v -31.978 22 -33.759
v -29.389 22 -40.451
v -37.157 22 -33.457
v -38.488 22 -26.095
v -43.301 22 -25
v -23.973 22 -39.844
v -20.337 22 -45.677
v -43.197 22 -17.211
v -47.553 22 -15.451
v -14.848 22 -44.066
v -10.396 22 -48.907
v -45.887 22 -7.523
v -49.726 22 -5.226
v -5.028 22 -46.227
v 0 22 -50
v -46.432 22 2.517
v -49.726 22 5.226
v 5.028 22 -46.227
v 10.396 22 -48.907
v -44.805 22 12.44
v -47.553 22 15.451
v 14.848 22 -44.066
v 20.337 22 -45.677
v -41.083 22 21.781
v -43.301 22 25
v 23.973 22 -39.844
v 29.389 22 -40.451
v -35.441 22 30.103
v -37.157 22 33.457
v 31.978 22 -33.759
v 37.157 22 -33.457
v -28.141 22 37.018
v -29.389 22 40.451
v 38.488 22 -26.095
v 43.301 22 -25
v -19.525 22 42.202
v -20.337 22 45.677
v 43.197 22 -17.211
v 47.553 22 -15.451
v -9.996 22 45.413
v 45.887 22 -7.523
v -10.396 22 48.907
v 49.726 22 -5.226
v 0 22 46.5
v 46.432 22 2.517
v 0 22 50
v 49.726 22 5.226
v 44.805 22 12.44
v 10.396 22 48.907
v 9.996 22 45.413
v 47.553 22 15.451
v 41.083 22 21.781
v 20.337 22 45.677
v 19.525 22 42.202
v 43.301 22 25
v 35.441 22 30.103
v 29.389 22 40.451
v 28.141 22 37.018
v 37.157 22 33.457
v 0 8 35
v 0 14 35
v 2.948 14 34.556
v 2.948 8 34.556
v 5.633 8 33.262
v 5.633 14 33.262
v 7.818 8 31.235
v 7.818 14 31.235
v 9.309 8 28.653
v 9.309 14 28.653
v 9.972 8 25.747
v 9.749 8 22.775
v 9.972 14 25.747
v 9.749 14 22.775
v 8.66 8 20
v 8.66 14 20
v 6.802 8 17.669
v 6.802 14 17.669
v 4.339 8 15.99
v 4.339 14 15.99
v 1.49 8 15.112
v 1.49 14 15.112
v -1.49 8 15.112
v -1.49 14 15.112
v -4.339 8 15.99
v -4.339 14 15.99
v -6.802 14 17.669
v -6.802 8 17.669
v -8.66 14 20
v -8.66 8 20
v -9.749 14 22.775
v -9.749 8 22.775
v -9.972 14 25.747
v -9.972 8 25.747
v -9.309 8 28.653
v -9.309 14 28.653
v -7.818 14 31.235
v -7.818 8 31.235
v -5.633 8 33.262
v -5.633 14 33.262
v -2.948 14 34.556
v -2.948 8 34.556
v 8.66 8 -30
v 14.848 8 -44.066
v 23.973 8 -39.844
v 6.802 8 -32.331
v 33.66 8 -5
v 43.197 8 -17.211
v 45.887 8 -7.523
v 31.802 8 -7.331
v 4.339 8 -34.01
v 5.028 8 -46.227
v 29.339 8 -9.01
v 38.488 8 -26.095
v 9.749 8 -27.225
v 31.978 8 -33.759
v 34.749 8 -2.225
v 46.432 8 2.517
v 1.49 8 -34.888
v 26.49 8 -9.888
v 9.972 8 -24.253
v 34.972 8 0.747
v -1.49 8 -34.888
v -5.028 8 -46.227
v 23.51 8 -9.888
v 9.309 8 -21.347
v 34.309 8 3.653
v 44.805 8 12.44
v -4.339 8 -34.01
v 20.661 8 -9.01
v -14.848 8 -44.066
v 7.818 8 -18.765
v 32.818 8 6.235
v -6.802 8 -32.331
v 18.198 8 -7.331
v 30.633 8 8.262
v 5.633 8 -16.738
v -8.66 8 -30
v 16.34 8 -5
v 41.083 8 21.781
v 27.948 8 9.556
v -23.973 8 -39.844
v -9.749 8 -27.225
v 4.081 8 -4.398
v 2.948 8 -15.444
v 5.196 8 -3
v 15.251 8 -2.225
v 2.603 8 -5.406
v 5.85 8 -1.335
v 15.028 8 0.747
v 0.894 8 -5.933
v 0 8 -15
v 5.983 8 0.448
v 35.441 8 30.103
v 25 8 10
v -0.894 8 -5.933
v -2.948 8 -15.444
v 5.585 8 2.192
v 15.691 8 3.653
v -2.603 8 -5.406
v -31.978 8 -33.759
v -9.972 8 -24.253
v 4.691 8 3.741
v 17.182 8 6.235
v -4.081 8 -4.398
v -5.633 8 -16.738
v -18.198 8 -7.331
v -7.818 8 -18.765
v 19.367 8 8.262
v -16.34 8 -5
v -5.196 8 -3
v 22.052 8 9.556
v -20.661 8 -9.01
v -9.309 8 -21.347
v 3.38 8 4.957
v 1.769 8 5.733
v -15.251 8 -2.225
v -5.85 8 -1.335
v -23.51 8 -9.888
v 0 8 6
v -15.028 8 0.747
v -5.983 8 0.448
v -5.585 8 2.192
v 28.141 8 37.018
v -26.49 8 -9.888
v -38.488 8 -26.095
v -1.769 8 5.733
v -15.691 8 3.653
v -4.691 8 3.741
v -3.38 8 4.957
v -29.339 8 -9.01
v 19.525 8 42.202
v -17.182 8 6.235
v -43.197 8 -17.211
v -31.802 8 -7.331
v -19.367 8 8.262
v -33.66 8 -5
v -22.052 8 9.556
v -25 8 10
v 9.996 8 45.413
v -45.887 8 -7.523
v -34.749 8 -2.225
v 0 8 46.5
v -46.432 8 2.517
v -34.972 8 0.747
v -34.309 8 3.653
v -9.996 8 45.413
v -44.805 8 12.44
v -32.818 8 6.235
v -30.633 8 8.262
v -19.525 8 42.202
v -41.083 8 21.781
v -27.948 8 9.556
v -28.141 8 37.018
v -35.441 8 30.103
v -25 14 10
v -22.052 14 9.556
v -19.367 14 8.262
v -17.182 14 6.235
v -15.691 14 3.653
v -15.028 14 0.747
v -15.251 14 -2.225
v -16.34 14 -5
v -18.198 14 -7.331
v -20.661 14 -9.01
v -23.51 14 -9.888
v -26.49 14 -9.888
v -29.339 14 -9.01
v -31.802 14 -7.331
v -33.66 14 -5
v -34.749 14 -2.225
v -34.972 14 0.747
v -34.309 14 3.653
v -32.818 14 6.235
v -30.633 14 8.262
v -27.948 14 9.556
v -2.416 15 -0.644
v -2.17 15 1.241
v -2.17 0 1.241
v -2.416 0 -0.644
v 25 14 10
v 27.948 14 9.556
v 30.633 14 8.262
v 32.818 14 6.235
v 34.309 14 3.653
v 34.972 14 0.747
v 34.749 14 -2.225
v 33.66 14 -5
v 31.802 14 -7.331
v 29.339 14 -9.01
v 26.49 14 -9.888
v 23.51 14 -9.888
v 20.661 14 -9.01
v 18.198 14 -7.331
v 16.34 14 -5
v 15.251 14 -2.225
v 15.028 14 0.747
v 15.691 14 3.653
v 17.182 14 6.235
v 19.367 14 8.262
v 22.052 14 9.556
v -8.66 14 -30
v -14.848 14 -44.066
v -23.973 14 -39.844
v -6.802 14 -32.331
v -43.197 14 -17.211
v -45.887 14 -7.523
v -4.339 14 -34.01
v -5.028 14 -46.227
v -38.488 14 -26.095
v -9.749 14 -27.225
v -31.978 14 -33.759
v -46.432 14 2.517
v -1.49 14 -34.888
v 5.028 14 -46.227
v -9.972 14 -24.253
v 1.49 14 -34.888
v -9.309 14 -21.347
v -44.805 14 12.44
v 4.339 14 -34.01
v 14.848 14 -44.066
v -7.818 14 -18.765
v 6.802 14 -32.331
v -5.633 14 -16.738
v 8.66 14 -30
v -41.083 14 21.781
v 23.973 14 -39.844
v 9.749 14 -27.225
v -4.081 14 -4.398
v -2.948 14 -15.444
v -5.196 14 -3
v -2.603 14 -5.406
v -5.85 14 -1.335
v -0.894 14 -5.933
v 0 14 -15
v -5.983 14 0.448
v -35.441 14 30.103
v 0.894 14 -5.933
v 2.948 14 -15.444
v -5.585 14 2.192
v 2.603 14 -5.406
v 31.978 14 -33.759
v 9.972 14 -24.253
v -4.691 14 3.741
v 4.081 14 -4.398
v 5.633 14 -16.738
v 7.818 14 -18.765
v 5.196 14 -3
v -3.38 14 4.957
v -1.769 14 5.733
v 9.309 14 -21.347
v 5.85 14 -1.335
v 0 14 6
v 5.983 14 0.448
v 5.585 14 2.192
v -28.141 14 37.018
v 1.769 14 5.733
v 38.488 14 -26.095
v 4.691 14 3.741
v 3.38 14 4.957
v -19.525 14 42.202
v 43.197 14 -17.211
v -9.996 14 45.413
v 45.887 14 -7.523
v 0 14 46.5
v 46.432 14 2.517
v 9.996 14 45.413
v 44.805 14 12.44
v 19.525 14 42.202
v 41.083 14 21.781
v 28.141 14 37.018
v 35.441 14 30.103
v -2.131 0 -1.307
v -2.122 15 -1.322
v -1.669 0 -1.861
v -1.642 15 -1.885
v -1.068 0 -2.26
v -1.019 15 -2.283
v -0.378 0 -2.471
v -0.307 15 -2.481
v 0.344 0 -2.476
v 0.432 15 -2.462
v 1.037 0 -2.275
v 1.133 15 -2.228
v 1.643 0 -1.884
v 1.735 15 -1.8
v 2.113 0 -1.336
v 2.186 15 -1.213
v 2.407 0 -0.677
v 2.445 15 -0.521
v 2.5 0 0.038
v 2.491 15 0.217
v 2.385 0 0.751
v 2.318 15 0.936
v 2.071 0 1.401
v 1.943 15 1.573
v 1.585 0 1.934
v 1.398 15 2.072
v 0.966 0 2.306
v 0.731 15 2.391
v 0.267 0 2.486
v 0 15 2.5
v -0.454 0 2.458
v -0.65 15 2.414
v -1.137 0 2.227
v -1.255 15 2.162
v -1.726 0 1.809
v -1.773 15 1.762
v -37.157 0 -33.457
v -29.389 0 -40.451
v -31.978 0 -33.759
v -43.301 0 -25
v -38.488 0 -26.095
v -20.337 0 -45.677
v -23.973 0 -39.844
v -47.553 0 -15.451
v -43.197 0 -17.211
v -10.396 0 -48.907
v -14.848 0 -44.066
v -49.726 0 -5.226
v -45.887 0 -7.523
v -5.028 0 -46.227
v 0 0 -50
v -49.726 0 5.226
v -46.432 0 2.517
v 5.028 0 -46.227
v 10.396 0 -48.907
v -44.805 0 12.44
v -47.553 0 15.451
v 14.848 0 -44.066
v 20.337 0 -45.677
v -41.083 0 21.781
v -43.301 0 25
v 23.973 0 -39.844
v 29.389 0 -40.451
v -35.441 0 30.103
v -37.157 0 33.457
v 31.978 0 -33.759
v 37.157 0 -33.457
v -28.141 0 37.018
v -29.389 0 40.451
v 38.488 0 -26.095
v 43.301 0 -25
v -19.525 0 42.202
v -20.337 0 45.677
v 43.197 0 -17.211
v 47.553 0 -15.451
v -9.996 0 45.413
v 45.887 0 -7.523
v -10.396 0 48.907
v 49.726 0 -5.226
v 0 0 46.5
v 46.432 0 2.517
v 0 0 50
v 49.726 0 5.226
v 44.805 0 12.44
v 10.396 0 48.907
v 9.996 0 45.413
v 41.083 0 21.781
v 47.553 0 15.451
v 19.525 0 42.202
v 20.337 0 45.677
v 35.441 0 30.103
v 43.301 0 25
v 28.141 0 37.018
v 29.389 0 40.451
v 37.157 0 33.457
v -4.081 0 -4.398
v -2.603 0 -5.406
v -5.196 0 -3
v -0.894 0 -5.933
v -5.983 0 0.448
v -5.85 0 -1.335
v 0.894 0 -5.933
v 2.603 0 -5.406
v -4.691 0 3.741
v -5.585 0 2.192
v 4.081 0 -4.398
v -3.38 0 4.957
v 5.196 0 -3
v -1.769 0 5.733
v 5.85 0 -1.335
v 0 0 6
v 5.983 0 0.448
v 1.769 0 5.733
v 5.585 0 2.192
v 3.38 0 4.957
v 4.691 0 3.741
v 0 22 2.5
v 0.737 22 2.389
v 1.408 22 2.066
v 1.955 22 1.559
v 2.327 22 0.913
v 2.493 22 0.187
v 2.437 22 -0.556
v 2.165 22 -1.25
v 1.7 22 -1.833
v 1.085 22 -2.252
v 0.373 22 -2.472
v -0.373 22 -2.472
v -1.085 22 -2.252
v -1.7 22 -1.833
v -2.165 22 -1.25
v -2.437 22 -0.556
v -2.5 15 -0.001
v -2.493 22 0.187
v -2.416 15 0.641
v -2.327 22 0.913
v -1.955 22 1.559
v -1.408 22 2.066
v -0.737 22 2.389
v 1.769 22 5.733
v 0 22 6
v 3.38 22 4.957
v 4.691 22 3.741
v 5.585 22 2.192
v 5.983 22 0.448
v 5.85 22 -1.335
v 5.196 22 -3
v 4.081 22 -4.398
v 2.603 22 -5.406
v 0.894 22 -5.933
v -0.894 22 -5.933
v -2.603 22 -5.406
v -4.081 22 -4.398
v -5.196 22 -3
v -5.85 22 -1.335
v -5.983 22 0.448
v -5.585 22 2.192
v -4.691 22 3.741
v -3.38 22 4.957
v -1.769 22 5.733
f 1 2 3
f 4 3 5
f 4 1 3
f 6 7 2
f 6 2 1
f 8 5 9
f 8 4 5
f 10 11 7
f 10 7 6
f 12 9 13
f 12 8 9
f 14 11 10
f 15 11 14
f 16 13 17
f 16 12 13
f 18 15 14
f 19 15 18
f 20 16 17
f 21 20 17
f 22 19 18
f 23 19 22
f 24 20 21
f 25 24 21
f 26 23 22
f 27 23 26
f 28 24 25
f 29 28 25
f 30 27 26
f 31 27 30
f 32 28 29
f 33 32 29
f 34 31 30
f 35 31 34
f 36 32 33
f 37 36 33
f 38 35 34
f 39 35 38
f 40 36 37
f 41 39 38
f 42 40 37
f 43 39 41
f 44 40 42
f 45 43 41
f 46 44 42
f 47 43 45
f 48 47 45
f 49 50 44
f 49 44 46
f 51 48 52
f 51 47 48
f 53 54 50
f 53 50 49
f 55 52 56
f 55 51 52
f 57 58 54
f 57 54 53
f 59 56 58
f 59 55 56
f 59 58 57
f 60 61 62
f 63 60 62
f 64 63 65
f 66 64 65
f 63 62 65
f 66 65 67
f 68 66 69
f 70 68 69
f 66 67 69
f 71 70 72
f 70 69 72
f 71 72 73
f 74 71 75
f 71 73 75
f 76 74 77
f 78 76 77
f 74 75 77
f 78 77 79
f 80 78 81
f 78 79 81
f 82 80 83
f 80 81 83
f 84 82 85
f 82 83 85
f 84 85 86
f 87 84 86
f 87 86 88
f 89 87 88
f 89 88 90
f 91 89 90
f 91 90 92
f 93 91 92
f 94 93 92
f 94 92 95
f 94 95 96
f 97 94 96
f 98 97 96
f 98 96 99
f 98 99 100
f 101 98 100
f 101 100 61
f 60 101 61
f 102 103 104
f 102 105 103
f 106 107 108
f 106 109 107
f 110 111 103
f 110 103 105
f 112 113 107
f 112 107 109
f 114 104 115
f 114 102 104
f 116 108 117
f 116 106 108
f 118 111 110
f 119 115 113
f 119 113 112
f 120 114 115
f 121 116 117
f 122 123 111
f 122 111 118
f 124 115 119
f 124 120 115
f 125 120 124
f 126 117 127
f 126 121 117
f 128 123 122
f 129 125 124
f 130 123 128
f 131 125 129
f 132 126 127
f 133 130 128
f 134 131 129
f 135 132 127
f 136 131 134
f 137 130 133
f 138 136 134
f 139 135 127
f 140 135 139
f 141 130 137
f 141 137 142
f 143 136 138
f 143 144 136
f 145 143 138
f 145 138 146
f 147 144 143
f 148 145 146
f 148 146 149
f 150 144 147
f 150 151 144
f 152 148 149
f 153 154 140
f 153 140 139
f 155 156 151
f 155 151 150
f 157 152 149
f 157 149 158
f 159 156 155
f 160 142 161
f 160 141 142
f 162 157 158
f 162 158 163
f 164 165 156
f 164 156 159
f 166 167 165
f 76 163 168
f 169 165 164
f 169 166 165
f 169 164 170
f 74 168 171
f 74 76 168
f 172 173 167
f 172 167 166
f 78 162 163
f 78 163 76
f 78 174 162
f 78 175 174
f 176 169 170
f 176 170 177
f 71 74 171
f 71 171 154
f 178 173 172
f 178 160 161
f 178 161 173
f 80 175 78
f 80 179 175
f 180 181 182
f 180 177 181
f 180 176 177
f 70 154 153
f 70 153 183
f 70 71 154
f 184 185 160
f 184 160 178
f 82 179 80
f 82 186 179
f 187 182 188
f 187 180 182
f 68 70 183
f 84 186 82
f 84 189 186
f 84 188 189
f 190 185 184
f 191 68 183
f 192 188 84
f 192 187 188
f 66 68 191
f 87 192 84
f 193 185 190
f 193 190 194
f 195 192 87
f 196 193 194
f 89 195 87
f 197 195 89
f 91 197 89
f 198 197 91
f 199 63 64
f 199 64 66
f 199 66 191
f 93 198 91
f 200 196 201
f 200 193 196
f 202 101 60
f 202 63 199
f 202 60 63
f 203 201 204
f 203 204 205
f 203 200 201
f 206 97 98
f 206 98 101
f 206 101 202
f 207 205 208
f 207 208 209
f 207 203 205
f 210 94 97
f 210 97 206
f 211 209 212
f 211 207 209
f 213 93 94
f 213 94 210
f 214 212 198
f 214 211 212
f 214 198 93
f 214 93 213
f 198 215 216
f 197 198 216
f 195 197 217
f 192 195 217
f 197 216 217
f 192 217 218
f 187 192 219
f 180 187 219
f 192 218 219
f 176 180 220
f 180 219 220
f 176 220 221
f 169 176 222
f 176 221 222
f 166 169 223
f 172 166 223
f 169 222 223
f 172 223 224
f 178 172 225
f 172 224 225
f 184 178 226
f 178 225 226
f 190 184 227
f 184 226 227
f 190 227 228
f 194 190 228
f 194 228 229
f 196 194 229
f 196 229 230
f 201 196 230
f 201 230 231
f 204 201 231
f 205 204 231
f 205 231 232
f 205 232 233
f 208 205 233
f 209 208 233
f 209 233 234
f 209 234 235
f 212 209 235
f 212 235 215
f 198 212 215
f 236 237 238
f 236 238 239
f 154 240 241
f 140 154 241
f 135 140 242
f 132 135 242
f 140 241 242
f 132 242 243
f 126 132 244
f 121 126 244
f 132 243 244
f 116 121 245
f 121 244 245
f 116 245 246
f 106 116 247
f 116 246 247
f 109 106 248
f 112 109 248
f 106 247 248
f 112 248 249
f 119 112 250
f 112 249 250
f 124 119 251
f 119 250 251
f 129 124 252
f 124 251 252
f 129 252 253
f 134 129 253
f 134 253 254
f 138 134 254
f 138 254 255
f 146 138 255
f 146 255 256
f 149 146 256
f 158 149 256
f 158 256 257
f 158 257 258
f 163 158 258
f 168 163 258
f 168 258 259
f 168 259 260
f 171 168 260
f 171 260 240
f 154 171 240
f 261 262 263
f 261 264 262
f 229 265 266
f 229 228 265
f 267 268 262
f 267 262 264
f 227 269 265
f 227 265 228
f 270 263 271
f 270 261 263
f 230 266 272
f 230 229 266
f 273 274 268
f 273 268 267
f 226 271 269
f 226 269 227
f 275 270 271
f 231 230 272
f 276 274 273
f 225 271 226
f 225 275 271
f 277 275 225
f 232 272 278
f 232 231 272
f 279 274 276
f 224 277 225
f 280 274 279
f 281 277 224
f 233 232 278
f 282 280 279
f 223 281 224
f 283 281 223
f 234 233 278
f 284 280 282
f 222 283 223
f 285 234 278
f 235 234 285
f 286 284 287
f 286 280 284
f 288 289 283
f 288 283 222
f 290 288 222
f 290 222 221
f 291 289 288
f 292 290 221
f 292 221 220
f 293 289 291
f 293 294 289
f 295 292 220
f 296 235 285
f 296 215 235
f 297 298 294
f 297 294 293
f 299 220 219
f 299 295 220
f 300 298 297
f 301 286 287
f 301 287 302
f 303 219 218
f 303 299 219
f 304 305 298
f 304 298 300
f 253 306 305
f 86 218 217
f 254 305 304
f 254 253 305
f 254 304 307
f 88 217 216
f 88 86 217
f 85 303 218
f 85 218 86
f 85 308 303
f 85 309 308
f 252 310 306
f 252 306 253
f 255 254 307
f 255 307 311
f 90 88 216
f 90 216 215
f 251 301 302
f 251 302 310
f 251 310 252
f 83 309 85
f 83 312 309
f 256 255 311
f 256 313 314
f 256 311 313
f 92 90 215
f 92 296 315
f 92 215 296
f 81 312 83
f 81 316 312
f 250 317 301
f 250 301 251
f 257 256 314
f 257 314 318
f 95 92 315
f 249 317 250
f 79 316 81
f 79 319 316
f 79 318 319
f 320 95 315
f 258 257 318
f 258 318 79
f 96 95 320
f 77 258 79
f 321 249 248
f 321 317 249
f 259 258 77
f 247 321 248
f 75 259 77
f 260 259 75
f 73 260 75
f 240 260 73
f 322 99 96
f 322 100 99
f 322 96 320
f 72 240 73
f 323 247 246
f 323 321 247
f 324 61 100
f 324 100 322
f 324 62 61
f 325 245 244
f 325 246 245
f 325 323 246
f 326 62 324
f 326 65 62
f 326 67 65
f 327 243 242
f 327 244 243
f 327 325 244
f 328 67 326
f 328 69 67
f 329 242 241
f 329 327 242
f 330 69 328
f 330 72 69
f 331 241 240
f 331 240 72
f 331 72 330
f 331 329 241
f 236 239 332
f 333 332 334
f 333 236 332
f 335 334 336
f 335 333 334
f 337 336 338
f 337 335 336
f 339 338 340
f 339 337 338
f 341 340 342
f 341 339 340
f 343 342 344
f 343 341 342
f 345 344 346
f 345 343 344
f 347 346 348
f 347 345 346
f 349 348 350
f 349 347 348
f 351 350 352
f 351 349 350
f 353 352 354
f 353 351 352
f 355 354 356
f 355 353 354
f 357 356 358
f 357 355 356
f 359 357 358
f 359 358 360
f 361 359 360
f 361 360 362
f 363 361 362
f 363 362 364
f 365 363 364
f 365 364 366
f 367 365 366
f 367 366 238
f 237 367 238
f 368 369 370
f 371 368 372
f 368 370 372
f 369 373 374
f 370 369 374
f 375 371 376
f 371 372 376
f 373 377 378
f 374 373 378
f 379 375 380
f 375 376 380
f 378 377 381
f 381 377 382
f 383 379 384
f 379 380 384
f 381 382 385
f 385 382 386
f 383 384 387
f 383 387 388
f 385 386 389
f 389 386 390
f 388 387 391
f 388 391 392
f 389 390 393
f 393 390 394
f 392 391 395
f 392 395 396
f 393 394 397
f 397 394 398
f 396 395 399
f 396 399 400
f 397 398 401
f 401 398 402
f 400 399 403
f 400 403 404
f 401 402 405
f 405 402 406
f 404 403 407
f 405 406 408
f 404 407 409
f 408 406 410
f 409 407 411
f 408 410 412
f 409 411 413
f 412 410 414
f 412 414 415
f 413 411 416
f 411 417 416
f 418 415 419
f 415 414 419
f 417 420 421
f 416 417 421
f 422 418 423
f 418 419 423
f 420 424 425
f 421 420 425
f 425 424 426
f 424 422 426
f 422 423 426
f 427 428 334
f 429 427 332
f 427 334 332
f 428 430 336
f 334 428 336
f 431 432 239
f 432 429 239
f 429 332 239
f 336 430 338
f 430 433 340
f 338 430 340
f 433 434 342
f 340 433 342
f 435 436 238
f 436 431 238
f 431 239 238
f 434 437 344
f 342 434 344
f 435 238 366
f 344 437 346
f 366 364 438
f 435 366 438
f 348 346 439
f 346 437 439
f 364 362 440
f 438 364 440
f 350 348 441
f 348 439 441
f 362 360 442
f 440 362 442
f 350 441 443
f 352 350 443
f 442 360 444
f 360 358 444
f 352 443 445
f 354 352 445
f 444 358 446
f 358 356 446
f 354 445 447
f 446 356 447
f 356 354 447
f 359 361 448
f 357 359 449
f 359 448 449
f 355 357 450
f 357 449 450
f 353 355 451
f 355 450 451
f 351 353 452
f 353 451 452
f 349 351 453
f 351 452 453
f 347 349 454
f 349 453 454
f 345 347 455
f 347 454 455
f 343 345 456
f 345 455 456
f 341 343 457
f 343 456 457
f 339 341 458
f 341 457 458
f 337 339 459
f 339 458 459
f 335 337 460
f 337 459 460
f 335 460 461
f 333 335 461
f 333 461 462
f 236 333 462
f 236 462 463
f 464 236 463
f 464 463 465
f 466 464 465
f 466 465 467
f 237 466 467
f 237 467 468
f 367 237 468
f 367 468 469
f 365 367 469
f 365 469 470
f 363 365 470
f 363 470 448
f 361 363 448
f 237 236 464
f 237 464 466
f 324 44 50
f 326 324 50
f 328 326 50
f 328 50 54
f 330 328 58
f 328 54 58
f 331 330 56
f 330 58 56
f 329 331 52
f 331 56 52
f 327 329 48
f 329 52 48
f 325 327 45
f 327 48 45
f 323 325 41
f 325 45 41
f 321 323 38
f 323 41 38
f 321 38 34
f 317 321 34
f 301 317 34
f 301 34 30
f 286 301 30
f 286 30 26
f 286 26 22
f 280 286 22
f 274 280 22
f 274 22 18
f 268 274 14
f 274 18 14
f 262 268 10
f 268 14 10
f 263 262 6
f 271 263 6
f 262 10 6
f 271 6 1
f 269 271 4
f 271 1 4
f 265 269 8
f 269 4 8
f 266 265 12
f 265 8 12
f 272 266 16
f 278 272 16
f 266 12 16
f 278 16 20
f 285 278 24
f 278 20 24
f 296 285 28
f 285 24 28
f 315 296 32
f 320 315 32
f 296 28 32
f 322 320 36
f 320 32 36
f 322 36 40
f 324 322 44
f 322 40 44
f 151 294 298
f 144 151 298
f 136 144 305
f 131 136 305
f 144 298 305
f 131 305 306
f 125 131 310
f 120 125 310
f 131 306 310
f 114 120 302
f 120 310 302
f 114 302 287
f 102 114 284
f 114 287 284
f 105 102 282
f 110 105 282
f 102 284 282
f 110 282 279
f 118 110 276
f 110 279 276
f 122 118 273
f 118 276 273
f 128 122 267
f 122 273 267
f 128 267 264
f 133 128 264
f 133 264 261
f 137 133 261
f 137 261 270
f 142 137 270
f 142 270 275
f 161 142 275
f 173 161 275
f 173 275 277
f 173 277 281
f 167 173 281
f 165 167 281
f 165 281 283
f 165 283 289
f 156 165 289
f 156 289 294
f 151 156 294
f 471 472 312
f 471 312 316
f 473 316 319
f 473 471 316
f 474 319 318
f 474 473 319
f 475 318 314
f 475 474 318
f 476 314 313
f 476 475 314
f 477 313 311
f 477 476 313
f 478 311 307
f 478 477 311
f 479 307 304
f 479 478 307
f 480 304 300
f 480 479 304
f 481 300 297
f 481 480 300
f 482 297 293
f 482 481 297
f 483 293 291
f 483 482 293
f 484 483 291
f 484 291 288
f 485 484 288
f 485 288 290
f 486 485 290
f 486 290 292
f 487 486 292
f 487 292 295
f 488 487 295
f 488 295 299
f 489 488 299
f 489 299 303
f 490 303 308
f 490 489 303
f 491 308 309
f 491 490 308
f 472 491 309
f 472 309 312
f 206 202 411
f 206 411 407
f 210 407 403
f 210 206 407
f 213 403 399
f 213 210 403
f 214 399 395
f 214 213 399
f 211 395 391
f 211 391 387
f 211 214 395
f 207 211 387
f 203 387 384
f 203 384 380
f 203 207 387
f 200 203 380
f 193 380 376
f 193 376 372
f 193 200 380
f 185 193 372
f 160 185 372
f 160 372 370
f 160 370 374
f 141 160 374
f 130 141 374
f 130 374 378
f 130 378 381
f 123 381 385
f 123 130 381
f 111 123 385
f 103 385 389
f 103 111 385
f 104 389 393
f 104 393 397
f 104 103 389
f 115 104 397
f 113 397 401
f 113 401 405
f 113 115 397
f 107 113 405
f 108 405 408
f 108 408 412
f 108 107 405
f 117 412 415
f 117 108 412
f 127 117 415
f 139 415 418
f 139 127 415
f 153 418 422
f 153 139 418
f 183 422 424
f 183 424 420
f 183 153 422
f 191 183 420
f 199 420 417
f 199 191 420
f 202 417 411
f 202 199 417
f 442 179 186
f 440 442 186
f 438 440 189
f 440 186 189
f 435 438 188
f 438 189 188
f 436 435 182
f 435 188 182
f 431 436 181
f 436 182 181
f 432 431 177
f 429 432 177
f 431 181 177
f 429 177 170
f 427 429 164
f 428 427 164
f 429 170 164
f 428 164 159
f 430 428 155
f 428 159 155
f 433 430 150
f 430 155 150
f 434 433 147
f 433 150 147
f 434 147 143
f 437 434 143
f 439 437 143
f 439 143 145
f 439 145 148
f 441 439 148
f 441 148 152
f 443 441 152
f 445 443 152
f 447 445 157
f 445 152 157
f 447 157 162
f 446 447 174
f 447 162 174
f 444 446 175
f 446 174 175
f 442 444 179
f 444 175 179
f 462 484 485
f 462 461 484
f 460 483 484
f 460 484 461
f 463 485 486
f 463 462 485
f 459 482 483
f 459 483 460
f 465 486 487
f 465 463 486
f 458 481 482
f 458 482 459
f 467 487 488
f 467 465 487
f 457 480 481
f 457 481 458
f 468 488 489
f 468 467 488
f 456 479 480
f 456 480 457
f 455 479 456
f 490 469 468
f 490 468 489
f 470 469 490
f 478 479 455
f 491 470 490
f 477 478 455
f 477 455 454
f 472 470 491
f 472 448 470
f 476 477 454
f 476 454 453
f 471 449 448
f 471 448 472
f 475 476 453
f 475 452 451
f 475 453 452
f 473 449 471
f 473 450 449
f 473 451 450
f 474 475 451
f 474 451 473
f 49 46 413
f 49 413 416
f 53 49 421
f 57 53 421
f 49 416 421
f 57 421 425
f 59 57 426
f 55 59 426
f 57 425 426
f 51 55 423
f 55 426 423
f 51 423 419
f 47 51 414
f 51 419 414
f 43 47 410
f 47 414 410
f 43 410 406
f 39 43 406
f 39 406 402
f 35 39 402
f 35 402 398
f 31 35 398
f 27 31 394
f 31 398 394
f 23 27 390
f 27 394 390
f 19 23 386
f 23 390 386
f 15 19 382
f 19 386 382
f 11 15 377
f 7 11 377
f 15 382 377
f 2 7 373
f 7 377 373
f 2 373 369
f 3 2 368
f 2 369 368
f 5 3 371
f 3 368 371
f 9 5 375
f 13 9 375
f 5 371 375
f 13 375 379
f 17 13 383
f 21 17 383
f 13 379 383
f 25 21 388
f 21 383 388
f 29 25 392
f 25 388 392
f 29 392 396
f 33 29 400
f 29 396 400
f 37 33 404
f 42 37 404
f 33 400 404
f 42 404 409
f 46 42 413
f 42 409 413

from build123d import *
from build123d.topology import SkipClean

# Parameters (mm, degrees)
ESQUISSE1_R             = 50
BOSS_EXTRU_1_DEPTH      = 22
ESQUISSE2_R             = 2.5
ENL_V_MAT_EXTRU_1_DEPTH = 7
ENL_V_START             = -15
ENL_V_MAT_EXTRU_3_DEPTH = 15
ESQUISSE4_R             = 46.5
ESQUISSE4_R_2           = 6
ENL_V_MAT_EXTRU_4_DEPTH = 8
ENL_V_START_2           = -8
ESQUISSE5_R             = 46.5
ESQUISSE5_R_2           = 6
ENL_V_MAT_EXTRU_5_DEPTH = 8
ESQUISSE6_R             = 10
ENL_V_MAT_EXTRU_6_DEPTH = 8
ESQUISSE7_R             = 10
ENL_V_MAT_EXTRU_7_DEPTH = 8
ESQUISSE8_R             = 10
ENL_V_MAT_EXTRU_8_DEPTH = 8
ESQUISSE9_R             = 10
ENL_V_MAT_EXTRU_9_DEPTH = 8


with BuildPart() as part:
    # Esquisse1 → Boss.-Extru.1 (new body)
    with BuildSketch(Plane(origin=(0, 0, 0), x_dir=(1, 0, 0), z_dir=(0, 1, 0))):
        with Locations(Location((0, 0, 0), (0, 0, 270))):
            Circle(ESQUISSE1_R)
    extrude(amount=BOSS_EXTRU_1_DEPTH)

    # Esquisse2 → Enlèv. mat.-Extru.1 (cut)
    with BuildSketch(Plane(origin=(0, 22, 0), x_dir=(1, 0, 0), z_dir=(0, 1, 0))):
        with Locations(Location((0, 0, 0), (0, 0, 270))):
            Circle(ESQUISSE2_R)
    extrude(amount=-ENL_V_MAT_EXTRU_1_DEPTH, mode=Mode.SUBTRACT)

    # Esquisse3 → Enlèv. mat.-Extru.3 (cut)
    with SkipClean():  # the faces are left unmerged after this step: merging them gives an invalid solid
        with BuildSketch(Plane(origin=(0, 0, 0), x_dir=(-1, 0, 0), z_dir=(0, -1, 0)).offset(ENL_V_START)):
            with BuildLine():
                ThreePointArc((2.415699998, 0.643734045), (-2.479075587, 0.322775824), (2.170328924, -1.240835348))
                Line((2.170328924, -1.240835348), (2.415699998, 0.643734045))
            make_face()
        extrude(amount=ENL_V_MAT_EXTRU_3_DEPTH, mode=Mode.SUBTRACT)

    # Esquisse4 → Enlèv. mat.-Extru.4 (cut)
    with SkipClean():  # the faces are left unmerged after this step: merging them gives an invalid solid
        with BuildSketch(Plane(origin=(0, 22, 0), x_dir=(1, 0, 0), z_dir=(0, 1, 0))):
            with Locations(Location((0, 0, 0), (0, 0, 270))):
                Circle(ESQUISSE4_R)
            with Locations(Location((0, 0, 0), (0, 0, 270))):
                Circle(ESQUISSE4_R_2, mode=Mode.SUBTRACT)
        extrude(amount=-ENL_V_MAT_EXTRU_4_DEPTH, mode=Mode.SUBTRACT)

    # Esquisse5 → Enlèv. mat.-Extru.5 (cut)
    with SkipClean():  # the faces are left unmerged after this step: merging them gives an invalid solid
        with BuildSketch(Plane(origin=(0, 0, 0), x_dir=(-1, 0, 0), z_dir=(0, -1, 0)).offset(ENL_V_START_2)):
            with Locations(Location((0, 0, 0), (0, 0, 270))):
                Circle(ESQUISSE5_R)
            with Locations(Location((0, 0, 0), (0, 0, 270))):
                Circle(ESQUISSE5_R_2, mode=Mode.SUBTRACT)
        extrude(amount=ENL_V_MAT_EXTRU_5_DEPTH, mode=Mode.SUBTRACT)

    # Esquisse6 → Enlèv. mat.-Extru.6 (cut)
    with SkipClean():  # the faces are left unmerged after this step: merging them gives an invalid solid
        with BuildSketch(Plane(origin=(0, 14, 0), x_dir=(1, 0, 0), z_dir=(0, 1, 0))):
            with Locations(Location((0, 25, 0), (0, 0, 270))):
                Circle(ESQUISSE6_R)
        extrude(amount=-ENL_V_MAT_EXTRU_6_DEPTH, mode=Mode.SUBTRACT)

    # Esquisse7 → Enlèv. mat.-Extru.7 (cut)
    with SkipClean():  # the faces are left unmerged after this step: merging them gives an invalid solid
        with BuildSketch(Plane(origin=(0, 14, 0), x_dir=(1, 0, 0), z_dir=(0, 1, 0))):
            with Locations(Location((25, 0, 0), (0, 0, 270))):
                Circle(ESQUISSE7_R)
        extrude(amount=-ENL_V_MAT_EXTRU_7_DEPTH, mode=Mode.SUBTRACT)

    # Esquisse8 → Enlèv. mat.-Extru.8 (cut)
    with SkipClean():  # the faces are left unmerged after this step: merging them gives an invalid solid
        with BuildSketch(Plane(origin=(0, 14, 0), x_dir=(1, 0, 0), z_dir=(0, 1, 0))):
            with Locations(Location((0, -25, 0), (0, 0, 270))):
                Circle(ESQUISSE8_R)
        extrude(amount=-ENL_V_MAT_EXTRU_8_DEPTH, mode=Mode.SUBTRACT)

    # Esquisse9 → Enlèv. mat.-Extru.9 (cut)
    with SkipClean():  # the faces are left unmerged after this step: merging them gives an invalid solid
        with BuildSketch(Plane(origin=(0, 14, 0), x_dir=(1, 0, 0), z_dir=(0, 1, 0))):
            with Locations(Location((-25, 0, 0), (0, 0, 270))):
                Circle(ESQUISSE9_R)
        extrude(amount=-ENL_V_MAT_EXTRU_9_DEPTH, mode=Mode.SUBTRACT)


solid = part.part
